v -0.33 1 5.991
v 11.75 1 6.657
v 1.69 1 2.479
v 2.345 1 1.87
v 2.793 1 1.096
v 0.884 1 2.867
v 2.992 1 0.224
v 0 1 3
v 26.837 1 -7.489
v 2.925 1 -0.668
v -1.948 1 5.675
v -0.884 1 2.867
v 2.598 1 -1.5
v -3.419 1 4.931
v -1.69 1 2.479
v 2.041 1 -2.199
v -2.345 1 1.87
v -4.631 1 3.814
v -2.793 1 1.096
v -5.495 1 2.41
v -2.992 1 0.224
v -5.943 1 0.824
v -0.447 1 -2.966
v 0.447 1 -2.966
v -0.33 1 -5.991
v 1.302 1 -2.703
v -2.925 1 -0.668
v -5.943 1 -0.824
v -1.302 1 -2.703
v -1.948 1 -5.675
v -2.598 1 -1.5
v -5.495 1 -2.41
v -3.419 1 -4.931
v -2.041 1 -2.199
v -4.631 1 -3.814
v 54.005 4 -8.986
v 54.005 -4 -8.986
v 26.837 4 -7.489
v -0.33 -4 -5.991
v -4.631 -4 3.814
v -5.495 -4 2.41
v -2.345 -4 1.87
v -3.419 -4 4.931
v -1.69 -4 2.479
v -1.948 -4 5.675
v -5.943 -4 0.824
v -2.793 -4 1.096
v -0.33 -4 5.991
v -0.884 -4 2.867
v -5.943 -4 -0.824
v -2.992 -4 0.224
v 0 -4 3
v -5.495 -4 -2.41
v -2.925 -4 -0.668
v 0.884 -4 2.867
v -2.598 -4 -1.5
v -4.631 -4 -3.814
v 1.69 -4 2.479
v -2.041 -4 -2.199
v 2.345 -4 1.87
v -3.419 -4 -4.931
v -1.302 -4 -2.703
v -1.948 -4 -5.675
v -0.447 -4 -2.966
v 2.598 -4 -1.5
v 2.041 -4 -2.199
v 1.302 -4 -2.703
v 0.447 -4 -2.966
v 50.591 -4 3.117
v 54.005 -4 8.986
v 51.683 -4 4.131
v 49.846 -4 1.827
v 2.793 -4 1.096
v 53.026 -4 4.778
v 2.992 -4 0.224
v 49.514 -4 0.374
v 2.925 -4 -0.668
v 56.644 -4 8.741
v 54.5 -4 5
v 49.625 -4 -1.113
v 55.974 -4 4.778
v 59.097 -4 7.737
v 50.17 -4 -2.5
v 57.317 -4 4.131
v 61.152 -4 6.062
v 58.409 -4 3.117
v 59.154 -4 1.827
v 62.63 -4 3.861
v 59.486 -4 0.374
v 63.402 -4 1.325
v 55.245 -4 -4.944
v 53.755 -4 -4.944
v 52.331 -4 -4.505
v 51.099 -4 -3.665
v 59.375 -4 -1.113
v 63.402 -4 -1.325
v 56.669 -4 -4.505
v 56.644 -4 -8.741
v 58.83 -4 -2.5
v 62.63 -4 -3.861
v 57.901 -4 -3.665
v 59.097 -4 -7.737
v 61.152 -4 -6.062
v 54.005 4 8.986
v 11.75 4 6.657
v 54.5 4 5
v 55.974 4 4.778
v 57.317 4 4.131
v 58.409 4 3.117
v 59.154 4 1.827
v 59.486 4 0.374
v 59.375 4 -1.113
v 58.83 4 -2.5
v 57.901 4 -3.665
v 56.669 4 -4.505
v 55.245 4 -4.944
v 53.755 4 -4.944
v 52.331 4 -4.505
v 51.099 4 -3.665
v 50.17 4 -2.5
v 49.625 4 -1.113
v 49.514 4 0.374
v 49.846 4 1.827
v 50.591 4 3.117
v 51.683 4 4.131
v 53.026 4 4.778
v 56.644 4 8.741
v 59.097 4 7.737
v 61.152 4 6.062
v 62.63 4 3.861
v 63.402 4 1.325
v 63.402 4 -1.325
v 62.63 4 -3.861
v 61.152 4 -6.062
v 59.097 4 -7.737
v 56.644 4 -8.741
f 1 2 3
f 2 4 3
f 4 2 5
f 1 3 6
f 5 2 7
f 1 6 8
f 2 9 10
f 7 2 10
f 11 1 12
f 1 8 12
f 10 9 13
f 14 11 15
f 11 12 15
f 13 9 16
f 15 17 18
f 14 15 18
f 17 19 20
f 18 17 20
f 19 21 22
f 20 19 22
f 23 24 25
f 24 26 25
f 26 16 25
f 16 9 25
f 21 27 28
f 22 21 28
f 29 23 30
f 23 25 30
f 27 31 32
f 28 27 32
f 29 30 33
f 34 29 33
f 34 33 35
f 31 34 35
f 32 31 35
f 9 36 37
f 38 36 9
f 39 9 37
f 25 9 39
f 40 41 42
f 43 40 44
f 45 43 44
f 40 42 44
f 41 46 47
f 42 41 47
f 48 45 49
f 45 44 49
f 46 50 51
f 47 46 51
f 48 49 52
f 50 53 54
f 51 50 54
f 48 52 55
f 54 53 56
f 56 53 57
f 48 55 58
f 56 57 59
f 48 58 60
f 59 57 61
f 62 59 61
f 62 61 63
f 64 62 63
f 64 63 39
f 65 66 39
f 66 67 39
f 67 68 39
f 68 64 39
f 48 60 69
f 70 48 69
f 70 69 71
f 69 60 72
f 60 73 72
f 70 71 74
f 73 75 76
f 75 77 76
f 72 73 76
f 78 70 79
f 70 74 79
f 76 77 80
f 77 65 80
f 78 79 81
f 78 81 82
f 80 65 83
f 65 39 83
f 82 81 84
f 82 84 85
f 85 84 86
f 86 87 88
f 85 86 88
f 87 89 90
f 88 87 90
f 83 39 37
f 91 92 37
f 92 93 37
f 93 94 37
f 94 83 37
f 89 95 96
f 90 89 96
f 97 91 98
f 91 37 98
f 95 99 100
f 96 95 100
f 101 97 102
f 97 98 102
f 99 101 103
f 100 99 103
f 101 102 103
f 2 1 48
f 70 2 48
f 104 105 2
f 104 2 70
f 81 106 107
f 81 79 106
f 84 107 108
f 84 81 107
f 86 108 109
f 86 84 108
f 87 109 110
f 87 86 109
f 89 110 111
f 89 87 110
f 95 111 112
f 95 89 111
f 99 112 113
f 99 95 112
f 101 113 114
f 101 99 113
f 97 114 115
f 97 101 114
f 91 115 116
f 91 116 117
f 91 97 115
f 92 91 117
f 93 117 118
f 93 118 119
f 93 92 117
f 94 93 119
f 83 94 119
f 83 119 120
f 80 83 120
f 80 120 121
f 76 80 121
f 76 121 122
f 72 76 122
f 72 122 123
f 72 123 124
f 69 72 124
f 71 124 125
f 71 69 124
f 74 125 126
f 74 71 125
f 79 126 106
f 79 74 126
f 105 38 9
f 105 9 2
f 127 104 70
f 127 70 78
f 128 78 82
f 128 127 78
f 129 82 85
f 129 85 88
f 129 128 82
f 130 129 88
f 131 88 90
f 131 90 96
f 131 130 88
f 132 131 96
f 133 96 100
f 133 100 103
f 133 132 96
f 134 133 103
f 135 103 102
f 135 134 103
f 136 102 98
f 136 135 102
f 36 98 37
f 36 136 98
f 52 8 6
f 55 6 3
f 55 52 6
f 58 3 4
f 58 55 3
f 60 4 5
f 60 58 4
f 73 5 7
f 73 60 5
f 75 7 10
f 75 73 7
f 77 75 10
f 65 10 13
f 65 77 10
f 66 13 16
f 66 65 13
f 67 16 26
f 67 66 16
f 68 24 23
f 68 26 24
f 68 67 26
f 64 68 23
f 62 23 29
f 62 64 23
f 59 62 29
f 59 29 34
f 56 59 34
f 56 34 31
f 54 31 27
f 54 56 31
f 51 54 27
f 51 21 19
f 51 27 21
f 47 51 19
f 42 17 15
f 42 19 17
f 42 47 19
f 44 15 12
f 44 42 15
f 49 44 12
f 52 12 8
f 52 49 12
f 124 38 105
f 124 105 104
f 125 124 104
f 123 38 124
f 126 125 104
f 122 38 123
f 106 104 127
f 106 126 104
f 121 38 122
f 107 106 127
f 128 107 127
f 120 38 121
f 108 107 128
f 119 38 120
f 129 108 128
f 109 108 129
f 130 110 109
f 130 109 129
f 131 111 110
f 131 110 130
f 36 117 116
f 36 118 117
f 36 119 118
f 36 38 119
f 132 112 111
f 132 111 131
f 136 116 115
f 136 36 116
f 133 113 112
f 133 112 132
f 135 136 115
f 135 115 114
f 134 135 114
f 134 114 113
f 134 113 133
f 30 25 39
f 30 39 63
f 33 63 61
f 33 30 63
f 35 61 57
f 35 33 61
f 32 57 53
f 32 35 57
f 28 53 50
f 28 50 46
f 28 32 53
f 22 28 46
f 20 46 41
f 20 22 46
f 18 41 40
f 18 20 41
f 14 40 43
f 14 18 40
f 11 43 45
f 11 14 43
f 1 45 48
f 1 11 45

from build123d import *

# Parameters (mm, degrees)
SKETCH_1_R          = 3
SKETCH_1_R_2        = 5
EXTRUDE_1_DEPTH     = 4
CUT_EXTRUDE_1_DEPTH = 3


with BuildPart() as part:
    # 草图1 → 凸台-拉伸1 (new, symmetric)
    with BuildSketch(Plane(origin=(0, 0, 0), x_dir=(1, 0, 0), z_dir=(0, 1, 0))):
        with BuildLine():
            ThreePointArc((-0.330275229, 5.99090296), (-6, 0), (-0.330275229, -5.99090296))
            Line((-0.330275229, -5.99090296), (54.004587156, -8.98635444))
            ThreePointArc((54.004587156, -8.98635444), (63.5, 0), (54.004587156, 8.98635444))
            Line((54.004587156, 8.98635444), (-0.330275229, 5.99090296))
        make_face()
        with Locations(Location((0, 0, 0), (0, 0, 270))):
            Circle(SKETCH_1_R, mode=Mode.SUBTRACT)
        with Locations(Location((54.5, 0, 0), (0, 0, 270))):
            Circle(SKETCH_1_R_2, mode=Mode.SUBTRACT)
    extrude(amount=EXTRUDE_1_DEPTH, both=True)

    # 草图2 → 切除-拉伸1 (cut)
    with BuildSketch(Plane(origin=(0, 4, 0), x_dir=(1, 0, 0), z_dir=(0, 1, 0))):
        Polygon((26.837155963, 7.4886287), (11.750234203, -6.65689489), (-12.859516692, -6.65689489), (-12.859516692, 10.73344258), align=None)
    extrude(amount=-CUT_EXTRUDE_1_DEPTH, mode=Mode.SUBTRACT)


solid = part.part
